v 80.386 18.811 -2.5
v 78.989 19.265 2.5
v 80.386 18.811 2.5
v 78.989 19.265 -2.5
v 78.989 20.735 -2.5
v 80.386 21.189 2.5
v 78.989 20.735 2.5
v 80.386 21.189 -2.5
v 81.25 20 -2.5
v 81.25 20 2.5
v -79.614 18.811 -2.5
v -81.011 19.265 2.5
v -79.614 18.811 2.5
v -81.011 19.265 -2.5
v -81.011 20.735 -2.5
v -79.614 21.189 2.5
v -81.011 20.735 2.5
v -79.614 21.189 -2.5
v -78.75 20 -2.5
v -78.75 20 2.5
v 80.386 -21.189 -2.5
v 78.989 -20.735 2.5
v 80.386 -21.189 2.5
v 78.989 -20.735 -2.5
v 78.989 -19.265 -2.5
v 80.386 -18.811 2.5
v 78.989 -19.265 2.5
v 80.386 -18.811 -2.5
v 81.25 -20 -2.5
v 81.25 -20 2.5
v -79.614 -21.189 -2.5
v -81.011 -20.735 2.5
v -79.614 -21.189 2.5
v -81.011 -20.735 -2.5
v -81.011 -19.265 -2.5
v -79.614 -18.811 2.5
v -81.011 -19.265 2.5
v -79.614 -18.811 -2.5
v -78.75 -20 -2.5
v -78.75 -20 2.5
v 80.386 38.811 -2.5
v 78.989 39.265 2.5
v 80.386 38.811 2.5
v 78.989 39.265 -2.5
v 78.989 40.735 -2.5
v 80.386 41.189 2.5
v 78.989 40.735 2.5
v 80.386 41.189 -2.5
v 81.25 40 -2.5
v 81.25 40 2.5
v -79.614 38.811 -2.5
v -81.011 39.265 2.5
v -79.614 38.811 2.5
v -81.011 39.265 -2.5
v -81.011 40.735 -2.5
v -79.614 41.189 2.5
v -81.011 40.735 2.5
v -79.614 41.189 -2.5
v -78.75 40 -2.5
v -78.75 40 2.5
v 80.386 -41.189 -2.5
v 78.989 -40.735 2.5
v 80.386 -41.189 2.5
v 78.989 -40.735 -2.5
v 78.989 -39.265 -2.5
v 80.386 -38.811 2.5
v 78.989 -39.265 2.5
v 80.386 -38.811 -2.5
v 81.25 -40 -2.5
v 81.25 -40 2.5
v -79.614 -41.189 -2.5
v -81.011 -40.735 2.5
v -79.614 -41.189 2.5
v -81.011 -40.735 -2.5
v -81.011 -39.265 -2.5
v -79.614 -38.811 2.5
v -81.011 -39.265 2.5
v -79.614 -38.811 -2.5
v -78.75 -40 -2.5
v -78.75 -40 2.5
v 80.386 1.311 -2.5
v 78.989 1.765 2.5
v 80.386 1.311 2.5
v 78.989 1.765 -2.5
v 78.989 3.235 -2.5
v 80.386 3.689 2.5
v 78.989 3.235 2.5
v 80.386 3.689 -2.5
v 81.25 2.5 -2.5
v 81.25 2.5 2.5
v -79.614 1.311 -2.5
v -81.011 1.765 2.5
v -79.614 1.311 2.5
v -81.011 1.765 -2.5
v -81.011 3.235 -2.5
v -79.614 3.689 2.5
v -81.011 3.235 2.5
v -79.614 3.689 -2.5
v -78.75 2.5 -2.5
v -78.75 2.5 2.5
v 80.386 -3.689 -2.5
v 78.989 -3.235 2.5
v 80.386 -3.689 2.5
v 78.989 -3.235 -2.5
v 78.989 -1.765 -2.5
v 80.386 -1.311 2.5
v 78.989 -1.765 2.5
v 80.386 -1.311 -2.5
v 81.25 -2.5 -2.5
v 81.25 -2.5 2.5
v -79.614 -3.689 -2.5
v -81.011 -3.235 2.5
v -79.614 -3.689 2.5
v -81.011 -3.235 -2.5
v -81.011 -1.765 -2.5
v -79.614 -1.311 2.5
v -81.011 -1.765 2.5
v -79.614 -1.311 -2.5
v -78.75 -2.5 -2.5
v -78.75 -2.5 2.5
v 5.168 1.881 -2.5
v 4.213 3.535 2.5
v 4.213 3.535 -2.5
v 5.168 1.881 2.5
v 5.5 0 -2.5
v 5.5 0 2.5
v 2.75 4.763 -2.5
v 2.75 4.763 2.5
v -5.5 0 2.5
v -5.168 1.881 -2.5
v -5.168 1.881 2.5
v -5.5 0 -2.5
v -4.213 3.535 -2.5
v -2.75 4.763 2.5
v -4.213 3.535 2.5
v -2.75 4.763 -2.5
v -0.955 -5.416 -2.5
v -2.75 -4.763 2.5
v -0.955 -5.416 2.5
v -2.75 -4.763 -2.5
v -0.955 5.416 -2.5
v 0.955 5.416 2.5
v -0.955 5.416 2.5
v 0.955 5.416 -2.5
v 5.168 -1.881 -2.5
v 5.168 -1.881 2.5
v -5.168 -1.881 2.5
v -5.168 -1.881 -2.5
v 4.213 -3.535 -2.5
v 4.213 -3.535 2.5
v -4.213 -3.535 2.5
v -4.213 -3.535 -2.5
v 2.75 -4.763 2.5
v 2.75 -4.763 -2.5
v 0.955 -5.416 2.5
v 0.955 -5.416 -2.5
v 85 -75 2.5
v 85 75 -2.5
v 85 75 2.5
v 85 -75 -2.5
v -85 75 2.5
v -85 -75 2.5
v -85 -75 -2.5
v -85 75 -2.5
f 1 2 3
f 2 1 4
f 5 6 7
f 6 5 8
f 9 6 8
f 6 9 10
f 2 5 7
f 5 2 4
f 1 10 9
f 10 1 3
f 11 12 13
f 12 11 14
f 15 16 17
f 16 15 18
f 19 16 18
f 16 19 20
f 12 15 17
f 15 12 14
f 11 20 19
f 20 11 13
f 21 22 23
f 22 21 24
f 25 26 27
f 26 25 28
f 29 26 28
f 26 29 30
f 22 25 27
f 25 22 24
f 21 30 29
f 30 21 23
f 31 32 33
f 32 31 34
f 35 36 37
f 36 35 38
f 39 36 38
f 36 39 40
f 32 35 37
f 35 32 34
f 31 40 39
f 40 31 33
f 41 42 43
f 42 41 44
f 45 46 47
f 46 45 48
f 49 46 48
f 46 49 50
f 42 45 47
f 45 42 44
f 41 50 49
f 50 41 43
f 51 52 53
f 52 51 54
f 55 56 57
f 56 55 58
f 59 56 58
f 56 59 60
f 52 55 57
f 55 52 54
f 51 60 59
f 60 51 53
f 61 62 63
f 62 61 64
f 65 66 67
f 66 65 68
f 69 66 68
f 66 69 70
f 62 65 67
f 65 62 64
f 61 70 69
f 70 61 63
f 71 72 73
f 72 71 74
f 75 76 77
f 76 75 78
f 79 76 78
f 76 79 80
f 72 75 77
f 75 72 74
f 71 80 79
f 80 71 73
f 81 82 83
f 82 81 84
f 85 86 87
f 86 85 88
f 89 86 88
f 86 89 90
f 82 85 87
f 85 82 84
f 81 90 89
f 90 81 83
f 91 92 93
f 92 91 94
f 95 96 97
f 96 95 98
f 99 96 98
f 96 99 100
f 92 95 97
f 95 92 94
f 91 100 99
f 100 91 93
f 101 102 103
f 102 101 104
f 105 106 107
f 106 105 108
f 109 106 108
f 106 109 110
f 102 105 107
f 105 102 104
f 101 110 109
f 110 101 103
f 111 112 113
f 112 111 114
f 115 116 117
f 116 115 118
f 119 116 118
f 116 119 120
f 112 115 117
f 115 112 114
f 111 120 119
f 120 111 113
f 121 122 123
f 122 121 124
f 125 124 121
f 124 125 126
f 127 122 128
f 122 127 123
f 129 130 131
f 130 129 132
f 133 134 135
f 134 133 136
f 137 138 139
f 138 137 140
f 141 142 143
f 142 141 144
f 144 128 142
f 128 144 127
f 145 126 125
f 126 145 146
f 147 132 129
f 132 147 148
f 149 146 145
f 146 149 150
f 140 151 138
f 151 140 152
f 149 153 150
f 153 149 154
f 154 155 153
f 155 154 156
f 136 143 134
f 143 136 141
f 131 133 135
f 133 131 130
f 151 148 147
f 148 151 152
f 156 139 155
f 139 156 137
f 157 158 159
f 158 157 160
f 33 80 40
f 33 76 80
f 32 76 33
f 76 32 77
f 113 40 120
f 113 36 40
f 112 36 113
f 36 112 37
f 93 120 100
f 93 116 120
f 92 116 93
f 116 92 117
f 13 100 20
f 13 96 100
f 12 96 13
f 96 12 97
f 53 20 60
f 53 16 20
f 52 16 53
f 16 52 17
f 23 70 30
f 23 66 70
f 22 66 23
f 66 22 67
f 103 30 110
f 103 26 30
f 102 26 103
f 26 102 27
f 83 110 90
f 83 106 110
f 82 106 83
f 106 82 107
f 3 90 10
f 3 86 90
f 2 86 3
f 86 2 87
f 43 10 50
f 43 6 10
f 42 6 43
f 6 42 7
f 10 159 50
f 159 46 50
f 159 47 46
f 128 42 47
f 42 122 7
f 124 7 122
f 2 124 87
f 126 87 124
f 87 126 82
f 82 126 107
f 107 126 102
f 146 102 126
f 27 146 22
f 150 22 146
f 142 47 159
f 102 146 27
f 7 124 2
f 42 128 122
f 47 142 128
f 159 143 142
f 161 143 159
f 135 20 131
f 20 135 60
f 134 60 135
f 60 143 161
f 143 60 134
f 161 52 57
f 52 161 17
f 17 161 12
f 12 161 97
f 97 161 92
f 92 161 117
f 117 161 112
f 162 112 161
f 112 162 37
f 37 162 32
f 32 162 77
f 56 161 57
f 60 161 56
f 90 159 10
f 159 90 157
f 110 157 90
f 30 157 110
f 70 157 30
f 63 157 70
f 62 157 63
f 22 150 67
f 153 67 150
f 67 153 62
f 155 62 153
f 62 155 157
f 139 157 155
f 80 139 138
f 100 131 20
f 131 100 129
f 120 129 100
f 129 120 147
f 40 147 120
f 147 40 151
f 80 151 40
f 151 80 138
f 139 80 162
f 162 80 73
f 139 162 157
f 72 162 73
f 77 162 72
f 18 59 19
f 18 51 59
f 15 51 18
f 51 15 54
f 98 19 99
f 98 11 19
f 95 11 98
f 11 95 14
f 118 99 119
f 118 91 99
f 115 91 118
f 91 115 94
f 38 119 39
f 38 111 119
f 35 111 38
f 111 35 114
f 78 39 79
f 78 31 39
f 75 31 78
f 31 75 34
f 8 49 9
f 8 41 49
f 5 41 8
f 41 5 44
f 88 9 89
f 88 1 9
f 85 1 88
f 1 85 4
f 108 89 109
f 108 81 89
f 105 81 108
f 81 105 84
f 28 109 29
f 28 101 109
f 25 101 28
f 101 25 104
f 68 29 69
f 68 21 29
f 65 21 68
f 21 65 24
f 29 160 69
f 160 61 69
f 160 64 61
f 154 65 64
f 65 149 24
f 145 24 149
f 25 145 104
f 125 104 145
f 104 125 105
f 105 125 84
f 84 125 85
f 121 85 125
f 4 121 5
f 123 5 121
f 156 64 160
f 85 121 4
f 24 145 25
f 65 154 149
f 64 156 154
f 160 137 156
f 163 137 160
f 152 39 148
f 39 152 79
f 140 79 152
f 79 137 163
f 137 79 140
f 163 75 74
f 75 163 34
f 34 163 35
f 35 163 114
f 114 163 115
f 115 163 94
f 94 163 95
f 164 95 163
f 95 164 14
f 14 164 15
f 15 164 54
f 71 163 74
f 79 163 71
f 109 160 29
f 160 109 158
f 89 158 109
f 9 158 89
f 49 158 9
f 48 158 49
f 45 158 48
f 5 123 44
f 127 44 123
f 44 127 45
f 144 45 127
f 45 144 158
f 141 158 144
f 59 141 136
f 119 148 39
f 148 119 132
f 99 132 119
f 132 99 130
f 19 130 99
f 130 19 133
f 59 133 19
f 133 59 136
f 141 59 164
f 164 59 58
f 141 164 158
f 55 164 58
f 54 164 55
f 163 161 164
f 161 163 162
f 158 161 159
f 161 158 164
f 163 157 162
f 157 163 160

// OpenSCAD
/*
    The base plate is square with a width, length, and height.
    There are mounting holes that go through all
*/

module rectangular_plate_with_holes(size=[100,100,1], holes=[[3, [20,30]], [3, [20,-30]]]) {
    through_all_height = 1000;
    difference() {
        cube(size, center=true);
        for(hole=holes)translate([hole[1][0], hole[1][1], 0])cylinder(h=through_all_height, d=hole[0], center=true);
    };
};


function make_four_corners(x, y) = [for(pt=[[1,1], [-1, 1], [1, -1], [-1, -1]]) [x*pt[0], y*pt[1]]];
    

function get_support_plate_holes() = let(d1=5, d2=3) concat(
        [for(pt=make_four_corners(160/2, 140/2)) [d1, pt]],
        [for(pt=make_four_corners(160/2, 80/2)) [d2, pt]]
);
        

module support_base_plate(size) {
    rectangular_plate_with_holes(size=size, holes=get_support_plate_holes());
};


/* Return the hole pattern for a type A press */
function get_press_pressure_plate_holes(width=170, length=150) = let(d=2.5, x=width/2-5, y1=length/2-55, y2=length/2-35, y3=2.5) concat(
        [for(pt=make_four_corners(x, y1)) [d, pt]],
        [for(pt=make_four_corners(x, y2)) [d, pt]],
        [for(pt=make_four_corners(x, y3)) [d, pt]],
        [[11, [0,0]]] //  # M10
    );


//  Mounting hole at dead center
module press_pressure_plate_type_a_base(size) {
    holes = get_press_pressure_plate_holes(width=size[0], length=size[1]);
    rectangular_plate_with_holes(size=size, holes=holes);
} 
press_pressure_plate_type_a_base([170,150,5]);
//support_base_plate([170,150,5]);
